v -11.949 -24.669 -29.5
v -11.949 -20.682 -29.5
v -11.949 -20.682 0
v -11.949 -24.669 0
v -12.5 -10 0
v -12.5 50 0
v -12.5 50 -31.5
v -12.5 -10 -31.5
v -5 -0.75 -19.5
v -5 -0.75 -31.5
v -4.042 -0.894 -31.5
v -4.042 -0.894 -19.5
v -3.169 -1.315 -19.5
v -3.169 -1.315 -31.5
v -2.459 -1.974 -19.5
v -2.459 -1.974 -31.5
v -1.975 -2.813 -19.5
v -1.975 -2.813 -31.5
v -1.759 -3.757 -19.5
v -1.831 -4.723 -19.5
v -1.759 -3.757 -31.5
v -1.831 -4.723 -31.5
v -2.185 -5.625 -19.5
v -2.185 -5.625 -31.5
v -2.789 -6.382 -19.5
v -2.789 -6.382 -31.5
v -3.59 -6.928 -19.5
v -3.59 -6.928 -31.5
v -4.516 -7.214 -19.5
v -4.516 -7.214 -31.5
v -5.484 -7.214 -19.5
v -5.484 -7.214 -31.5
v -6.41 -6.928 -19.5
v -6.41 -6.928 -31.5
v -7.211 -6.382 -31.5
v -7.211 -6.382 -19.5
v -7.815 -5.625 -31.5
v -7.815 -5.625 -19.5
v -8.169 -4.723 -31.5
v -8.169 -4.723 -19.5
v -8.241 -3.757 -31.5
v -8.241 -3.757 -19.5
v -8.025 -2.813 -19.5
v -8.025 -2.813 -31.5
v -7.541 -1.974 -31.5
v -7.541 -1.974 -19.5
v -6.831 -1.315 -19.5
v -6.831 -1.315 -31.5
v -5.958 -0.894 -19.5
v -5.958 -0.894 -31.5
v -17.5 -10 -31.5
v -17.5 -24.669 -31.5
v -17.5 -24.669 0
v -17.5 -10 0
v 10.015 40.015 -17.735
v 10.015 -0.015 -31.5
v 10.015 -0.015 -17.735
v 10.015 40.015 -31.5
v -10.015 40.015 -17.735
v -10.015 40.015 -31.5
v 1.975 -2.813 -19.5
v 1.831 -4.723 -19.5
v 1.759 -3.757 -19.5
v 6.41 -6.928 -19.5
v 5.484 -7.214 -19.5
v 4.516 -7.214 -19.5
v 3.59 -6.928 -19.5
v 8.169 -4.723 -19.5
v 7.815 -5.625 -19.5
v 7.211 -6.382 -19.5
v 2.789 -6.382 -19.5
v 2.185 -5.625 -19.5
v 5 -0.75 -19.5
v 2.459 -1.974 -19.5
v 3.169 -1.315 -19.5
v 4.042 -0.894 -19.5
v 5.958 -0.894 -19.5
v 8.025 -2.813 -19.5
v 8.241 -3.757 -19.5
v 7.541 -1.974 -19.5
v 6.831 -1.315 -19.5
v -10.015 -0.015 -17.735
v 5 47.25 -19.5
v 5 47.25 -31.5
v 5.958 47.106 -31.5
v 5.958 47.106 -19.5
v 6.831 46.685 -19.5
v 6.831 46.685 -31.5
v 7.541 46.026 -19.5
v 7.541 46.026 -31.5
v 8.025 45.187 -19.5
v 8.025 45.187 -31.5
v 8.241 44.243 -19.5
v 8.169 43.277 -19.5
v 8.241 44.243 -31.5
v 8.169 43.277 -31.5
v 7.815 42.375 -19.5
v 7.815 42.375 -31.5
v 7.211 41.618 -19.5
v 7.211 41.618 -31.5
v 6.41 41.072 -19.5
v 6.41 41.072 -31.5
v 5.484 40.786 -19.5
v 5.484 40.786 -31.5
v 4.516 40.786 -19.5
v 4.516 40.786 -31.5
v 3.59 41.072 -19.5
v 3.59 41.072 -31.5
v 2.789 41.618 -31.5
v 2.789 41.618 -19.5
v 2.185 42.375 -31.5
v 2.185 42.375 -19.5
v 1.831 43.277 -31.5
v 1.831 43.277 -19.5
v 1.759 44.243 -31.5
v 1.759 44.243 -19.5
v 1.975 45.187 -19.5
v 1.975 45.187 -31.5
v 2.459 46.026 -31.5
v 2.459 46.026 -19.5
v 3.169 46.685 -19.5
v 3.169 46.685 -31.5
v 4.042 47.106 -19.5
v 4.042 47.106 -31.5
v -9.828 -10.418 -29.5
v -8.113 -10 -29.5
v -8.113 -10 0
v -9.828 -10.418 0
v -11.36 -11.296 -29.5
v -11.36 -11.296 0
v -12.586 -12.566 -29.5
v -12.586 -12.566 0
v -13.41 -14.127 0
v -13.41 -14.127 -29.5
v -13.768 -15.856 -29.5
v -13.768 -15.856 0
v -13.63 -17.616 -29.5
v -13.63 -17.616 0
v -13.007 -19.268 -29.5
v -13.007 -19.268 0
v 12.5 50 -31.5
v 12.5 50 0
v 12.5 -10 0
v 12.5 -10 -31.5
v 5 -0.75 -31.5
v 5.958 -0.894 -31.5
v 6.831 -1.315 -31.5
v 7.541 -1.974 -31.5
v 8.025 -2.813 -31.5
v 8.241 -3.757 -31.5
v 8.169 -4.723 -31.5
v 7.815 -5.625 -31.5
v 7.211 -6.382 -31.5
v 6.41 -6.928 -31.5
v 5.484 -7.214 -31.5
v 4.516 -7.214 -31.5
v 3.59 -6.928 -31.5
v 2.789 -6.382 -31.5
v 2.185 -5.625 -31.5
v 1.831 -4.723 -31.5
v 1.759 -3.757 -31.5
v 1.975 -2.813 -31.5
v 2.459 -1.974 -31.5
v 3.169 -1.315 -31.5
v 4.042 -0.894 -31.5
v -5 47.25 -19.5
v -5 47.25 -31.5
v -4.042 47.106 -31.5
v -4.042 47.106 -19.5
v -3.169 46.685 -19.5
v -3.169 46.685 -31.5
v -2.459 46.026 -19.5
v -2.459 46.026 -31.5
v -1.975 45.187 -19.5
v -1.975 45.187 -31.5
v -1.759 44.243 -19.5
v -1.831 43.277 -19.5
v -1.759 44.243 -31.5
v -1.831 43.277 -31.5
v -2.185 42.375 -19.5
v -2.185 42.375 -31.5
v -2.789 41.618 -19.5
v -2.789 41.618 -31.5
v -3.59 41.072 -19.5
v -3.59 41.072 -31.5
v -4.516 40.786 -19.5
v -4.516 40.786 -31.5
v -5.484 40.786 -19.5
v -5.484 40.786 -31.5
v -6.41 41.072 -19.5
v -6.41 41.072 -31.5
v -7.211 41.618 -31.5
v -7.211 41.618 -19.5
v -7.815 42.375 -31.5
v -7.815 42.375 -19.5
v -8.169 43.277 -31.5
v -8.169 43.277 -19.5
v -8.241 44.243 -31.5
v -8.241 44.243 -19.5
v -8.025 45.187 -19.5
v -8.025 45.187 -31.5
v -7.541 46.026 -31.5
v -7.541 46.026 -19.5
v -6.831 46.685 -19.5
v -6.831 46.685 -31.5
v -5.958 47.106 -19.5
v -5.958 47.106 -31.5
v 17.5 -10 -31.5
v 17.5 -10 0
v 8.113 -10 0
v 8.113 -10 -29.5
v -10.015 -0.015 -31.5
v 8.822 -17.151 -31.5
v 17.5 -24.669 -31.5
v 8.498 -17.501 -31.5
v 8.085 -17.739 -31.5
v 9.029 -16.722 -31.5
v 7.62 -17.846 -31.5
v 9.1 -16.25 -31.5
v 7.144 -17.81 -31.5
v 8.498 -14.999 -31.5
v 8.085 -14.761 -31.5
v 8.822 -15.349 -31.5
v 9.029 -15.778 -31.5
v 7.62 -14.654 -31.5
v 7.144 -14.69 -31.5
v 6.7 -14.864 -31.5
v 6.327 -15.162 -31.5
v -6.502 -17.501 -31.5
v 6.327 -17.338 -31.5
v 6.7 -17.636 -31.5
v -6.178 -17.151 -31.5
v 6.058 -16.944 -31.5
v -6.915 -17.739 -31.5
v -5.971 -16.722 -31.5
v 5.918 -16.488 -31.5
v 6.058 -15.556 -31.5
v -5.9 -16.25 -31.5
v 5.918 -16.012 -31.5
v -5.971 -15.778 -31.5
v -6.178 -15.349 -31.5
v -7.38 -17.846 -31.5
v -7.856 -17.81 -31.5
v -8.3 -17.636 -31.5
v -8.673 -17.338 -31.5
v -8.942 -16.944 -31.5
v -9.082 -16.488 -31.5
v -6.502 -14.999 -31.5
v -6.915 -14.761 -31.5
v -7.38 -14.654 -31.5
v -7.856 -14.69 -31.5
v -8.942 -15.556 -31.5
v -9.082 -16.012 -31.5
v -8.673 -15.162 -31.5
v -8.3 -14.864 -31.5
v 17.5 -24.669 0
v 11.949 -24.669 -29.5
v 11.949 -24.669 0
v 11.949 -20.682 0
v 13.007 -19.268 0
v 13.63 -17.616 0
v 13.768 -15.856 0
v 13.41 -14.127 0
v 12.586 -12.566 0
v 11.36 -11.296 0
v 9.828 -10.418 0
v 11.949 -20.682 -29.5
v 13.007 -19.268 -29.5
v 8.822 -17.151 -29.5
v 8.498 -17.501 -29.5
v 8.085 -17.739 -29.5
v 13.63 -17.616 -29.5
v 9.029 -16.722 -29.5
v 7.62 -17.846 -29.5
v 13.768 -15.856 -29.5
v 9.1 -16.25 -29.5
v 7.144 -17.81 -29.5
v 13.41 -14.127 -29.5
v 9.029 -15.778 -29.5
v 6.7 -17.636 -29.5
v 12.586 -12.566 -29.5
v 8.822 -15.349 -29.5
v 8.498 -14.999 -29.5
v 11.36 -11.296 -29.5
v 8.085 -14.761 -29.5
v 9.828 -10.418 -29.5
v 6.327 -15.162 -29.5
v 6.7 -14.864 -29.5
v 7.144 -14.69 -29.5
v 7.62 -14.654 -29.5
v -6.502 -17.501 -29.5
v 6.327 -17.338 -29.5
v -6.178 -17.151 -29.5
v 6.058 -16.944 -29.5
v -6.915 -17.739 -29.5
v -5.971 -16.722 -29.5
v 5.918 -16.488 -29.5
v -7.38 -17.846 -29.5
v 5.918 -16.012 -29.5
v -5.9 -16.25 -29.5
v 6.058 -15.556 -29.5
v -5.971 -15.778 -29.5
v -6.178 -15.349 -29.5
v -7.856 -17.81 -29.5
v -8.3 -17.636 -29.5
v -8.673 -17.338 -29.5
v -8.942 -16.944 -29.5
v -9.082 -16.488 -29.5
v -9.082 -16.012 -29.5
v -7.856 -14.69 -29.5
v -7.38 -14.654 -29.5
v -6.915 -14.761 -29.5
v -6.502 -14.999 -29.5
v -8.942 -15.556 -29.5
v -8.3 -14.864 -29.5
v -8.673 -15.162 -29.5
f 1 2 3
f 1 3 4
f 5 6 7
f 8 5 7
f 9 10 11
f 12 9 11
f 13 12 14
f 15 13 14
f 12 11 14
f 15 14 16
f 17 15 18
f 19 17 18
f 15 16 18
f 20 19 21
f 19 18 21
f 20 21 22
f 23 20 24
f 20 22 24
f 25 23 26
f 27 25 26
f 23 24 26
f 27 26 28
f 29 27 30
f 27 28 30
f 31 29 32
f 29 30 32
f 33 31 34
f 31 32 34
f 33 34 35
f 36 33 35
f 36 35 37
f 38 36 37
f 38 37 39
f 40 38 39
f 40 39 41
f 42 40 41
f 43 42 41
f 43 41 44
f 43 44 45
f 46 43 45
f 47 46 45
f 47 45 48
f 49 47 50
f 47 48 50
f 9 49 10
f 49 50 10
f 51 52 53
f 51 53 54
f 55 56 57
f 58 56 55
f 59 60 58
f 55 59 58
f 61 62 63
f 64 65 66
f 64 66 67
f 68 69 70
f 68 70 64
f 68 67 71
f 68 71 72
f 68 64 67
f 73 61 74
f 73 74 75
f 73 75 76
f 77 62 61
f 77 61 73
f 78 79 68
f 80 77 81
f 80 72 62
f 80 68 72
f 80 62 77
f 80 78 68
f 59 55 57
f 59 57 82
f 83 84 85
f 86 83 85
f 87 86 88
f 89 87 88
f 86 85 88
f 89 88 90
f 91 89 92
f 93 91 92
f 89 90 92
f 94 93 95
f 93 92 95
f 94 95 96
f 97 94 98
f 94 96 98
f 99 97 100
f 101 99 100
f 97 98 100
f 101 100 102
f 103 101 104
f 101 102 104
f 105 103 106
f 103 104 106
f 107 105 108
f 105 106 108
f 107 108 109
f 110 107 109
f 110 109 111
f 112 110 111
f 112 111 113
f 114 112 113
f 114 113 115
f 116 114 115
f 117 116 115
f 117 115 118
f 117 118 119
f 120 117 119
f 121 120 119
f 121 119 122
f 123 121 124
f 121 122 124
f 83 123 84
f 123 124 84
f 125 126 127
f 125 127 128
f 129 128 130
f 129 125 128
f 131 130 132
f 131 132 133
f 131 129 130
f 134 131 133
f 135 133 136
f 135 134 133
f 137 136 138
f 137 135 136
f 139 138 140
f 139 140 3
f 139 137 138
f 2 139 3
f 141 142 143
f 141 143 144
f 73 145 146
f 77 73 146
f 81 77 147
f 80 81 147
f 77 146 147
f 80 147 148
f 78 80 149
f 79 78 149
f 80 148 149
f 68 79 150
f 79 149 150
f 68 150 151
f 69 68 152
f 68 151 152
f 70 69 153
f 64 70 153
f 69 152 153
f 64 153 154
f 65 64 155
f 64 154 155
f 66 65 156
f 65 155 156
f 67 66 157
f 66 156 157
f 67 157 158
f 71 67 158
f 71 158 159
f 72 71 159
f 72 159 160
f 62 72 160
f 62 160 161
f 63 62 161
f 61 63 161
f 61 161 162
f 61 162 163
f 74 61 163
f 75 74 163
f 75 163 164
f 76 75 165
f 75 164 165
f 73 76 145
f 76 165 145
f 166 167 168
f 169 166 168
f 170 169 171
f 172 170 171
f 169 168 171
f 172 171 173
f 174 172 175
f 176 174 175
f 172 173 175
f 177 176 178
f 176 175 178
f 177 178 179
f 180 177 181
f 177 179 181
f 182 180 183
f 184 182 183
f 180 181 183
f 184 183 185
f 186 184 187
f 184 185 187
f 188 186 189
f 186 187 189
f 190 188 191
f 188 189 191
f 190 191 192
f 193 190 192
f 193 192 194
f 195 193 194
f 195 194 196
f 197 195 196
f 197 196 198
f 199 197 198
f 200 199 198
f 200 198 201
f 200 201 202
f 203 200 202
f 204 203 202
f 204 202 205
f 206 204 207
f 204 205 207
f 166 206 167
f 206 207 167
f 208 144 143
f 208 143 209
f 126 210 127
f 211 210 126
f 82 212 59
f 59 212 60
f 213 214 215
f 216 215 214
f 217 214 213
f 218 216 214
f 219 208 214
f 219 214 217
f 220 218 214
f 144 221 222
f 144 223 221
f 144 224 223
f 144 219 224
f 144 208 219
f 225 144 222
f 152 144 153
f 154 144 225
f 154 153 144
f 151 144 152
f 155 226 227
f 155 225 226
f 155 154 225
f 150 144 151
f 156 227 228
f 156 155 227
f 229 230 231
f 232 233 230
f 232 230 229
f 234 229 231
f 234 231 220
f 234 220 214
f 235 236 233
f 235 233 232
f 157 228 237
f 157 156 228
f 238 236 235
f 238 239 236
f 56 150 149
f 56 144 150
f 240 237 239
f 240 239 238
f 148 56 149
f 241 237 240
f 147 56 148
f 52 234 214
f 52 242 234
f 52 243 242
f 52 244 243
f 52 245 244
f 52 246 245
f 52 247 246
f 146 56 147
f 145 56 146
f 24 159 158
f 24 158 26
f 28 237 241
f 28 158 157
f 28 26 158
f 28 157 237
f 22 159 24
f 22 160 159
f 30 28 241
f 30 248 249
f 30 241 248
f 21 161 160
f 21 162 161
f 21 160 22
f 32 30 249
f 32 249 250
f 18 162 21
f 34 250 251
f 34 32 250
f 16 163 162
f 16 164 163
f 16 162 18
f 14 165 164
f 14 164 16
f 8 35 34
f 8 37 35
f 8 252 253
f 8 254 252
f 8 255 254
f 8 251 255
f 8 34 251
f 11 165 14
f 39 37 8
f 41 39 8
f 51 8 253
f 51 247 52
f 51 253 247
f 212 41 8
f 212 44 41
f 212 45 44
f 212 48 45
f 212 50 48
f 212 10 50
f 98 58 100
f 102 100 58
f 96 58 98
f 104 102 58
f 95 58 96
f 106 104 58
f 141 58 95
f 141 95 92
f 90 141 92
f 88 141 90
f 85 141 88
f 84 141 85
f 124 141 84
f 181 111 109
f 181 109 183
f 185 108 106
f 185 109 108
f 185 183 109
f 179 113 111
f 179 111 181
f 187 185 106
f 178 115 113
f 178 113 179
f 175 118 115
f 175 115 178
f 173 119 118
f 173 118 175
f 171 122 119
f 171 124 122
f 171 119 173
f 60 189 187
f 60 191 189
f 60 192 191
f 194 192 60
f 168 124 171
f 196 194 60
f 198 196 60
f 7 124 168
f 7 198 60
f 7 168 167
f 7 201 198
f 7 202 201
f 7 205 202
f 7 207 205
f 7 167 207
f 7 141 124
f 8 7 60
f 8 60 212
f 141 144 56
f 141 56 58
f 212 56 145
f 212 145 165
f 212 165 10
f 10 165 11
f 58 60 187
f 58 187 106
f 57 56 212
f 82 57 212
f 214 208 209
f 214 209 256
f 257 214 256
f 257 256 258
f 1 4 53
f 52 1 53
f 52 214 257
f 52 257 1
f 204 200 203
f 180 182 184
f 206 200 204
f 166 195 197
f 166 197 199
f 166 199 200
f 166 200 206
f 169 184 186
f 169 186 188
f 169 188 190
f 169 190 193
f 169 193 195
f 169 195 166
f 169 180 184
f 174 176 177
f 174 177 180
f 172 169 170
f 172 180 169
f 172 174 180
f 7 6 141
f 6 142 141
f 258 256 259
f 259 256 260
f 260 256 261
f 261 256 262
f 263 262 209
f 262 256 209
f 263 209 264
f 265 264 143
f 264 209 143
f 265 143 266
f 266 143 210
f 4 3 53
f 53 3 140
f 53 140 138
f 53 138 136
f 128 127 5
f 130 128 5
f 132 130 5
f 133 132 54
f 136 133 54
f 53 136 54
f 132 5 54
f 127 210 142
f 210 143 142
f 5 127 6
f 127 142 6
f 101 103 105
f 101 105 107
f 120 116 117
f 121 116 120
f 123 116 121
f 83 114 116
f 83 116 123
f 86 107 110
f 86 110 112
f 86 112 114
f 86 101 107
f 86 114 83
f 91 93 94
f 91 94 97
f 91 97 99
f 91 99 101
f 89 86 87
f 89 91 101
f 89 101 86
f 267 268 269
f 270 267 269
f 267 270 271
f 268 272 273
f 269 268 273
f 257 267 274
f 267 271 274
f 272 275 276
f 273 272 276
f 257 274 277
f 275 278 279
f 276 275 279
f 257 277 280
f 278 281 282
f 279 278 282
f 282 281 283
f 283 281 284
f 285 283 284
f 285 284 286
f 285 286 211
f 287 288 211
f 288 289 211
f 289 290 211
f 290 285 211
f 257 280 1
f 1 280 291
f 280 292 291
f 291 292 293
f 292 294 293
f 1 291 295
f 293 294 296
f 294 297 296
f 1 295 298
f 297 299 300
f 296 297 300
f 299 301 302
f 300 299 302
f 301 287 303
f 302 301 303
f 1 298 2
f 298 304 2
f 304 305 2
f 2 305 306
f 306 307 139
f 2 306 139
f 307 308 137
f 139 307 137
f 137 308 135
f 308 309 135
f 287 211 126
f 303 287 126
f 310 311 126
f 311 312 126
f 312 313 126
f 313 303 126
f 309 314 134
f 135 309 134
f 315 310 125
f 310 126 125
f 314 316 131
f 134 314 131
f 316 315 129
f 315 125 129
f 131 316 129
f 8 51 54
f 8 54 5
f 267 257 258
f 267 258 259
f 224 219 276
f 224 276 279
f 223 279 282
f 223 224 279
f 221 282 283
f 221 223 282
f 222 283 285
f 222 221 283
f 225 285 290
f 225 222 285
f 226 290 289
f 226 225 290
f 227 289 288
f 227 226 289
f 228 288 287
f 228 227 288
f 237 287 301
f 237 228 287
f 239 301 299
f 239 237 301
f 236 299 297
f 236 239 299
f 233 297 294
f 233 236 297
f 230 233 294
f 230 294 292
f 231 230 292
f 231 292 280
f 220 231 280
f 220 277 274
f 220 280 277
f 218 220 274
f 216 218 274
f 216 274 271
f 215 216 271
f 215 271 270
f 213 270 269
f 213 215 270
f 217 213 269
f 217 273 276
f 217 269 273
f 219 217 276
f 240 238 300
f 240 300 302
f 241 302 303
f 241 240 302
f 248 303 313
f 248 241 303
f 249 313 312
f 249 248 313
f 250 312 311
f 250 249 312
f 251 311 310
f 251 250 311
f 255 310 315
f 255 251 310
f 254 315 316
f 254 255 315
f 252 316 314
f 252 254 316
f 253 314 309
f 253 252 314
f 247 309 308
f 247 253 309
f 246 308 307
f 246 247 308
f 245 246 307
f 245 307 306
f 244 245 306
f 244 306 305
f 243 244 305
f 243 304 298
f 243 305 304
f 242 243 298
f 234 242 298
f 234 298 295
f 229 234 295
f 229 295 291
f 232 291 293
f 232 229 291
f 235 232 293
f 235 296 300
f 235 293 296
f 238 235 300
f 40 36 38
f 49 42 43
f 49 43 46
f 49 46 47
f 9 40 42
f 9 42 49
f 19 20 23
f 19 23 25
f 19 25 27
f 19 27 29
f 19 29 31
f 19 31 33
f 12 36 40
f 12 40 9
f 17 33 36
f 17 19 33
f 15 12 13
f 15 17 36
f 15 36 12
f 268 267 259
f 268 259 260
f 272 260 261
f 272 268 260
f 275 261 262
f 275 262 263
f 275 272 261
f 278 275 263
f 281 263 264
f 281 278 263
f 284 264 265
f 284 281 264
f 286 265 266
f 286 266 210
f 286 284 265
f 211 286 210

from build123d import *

# Parameters (mm, degrees)
SKETCH1_W               = 31.5
SKETCH1_H               = 60
BOSS_EXTRUDE1_DEPTH     = 12.5
SKETCH2_W               = 5.015
SKETCH2_H               = 40.03
SKETCH2_W_2             = 10
CUT_EXTRUDE1_DEPTH      = 13.765
SKETCH6_R               = 3.25
CUT_EXTRUDE2_DEPTH      = 12
BOSS_EXTRUDE5_DEPTH     = 31.5
BOSS_EXTRUDE6_DEPTH     = 2
CUT_EXTRUDE3_DEPTH      = 61.634148794
CUT_EXTRUDE3_DEPTH_BACK = 61.634148794
SKETCH10_R              = 1.6


with BuildPart() as part:
    # Sketch1 → Boss-Extrude1 (new, symmetric)
    with BuildSketch(Plane(origin=(0, 0, 0), x_dir=(0, 0, -1), z_dir=(1, 0, 0))):
        with Locations((15.75, 20)):
            Rectangle(SKETCH1_W, SKETCH1_H)
    extrude(amount=BOSS_EXTRUDE1_DEPTH, both=True)

    # Sketch2 → Cut-Extrude1 (cut, symmetric)
    with BuildSketch(Plane(origin=(0, 0, -31.5), x_dir=(-1, 0, 0), z_dir=(0, 0, -1))):
        with Locations((7.5075, 20)):
            Rectangle(SKETCH2_W, SKETCH2_H)
        with Locations((0, 20)):
            Rectangle(SKETCH2_W_2, SKETCH2_H)
        with Locations((-7.5075, 20)):
            Rectangle(SKETCH2_W, SKETCH2_H)
    extrude(amount=CUT_EXTRUDE1_DEPTH, both=True, mode=Mode.SUBTRACT)

    # Sketch6 → Cut-Extrude2 (cut)
    with BuildSketch(Plane(origin=(0, 0, -31.5), x_dir=(-1, 0, 0), z_dir=(0, 0, -1))):
        with Locations(Location((-5, 44, 0), (0, 0, 90))):
            Circle(SKETCH6_R)
        with Locations(Location((5, 44, 0), (0, 0, 90))):
            Circle(SKETCH6_R)
        with Locations(Location((5, -4, 0), (0, 0, 90))):
            Circle(SKETCH6_R)
        with Locations(Location((-5, -4, 0), (0, 0, 90))):
            Circle(SKETCH6_R)
    extrude(amount=-CUT_EXTRUDE2_DEPTH, mode=Mode.SUBTRACT)

    # Sketch9 → Boss-Extrude5 (add)
    with BuildSketch(Plane(origin=(0, 0, -31.5), x_dir=(-1, 0, 0), z_dir=(0, 0, -1))):
        with BuildLine():
            Line((11.949417382, -20.681826368), (11.949417382, -24.669417382))
            Line((11.949417382, -24.669417382), (17.5, -24.669417382))
            Line((17.5, -24.669417382), (17.5, -10))
            Line((17.5, -10), (8.113106842, -10))
            ThreePointArc((8.113106842, -10), (13.410384211, -14.127322804), (11.949417382, -20.681826368))
        make_face()
        with BuildLine():
            Line((-17.5, -24.669417382), (-11.949417382, -24.669417382))
            Line((-11.949417382, -24.669417382), (-11.949417382, -20.681826368))
            ThreePointArc((-11.949417382, -20.681826368), (-13.410384211, -14.127322804), (-8.113106842, -10))
            Line((-8.113106842, -10), (-17.5, -10))
            Line((-17.5, -10), (-17.5, -24.669417382))
        make_face()
    extrude(amount=-BOSS_EXTRUDE5_DEPTH)

    # Sketch9<4> → Boss-Extrude6 (add)
    with BuildSketch(Plane(origin=(0, 0, -31.5), x_dir=(-1, 0, 0), z_dir=(0, 0, -1))):
        with BuildLine():
            Line((8.113106842, -10), (-8.113106842, -10))
            ThreePointArc((-8.113106842, -10), (-13.410384211, -14.127322804), (-11.949417382, -20.681826368))
            Line((-11.949417382, -20.681826368), (-11.949417382, -24.669417382))
            Line((-11.949417382, -24.669417382), (11.949417382, -24.669417382))
            Line((11.949417382, -24.669417382), (11.949417382, -20.681826368))
            ThreePointArc((11.949417382, -20.681826368), (13.410384211, -14.127322804), (8.113106842, -10))
        make_face()
    extrude(amount=-BOSS_EXTRUDE6_DEPTH)

    # Sketch10 → Cut-Extrude3 (cut, two sides: drawn at the far end of the back side and taken through both)
    with BuildSketch(Plane.XY.offset(-29.5).offset(-CUT_EXTRUDE3_DEPTH_BACK)):
        with Locations((-7.5, -16.25)):
            Circle(SKETCH10_R)
        with Locations((7.5, -16.25)):
            Circle(SKETCH10_R)
    extrude(amount=CUT_EXTRUDE3_DEPTH + CUT_EXTRUDE3_DEPTH_BACK, mode=Mode.SUBTRACT)


solid = part.part
